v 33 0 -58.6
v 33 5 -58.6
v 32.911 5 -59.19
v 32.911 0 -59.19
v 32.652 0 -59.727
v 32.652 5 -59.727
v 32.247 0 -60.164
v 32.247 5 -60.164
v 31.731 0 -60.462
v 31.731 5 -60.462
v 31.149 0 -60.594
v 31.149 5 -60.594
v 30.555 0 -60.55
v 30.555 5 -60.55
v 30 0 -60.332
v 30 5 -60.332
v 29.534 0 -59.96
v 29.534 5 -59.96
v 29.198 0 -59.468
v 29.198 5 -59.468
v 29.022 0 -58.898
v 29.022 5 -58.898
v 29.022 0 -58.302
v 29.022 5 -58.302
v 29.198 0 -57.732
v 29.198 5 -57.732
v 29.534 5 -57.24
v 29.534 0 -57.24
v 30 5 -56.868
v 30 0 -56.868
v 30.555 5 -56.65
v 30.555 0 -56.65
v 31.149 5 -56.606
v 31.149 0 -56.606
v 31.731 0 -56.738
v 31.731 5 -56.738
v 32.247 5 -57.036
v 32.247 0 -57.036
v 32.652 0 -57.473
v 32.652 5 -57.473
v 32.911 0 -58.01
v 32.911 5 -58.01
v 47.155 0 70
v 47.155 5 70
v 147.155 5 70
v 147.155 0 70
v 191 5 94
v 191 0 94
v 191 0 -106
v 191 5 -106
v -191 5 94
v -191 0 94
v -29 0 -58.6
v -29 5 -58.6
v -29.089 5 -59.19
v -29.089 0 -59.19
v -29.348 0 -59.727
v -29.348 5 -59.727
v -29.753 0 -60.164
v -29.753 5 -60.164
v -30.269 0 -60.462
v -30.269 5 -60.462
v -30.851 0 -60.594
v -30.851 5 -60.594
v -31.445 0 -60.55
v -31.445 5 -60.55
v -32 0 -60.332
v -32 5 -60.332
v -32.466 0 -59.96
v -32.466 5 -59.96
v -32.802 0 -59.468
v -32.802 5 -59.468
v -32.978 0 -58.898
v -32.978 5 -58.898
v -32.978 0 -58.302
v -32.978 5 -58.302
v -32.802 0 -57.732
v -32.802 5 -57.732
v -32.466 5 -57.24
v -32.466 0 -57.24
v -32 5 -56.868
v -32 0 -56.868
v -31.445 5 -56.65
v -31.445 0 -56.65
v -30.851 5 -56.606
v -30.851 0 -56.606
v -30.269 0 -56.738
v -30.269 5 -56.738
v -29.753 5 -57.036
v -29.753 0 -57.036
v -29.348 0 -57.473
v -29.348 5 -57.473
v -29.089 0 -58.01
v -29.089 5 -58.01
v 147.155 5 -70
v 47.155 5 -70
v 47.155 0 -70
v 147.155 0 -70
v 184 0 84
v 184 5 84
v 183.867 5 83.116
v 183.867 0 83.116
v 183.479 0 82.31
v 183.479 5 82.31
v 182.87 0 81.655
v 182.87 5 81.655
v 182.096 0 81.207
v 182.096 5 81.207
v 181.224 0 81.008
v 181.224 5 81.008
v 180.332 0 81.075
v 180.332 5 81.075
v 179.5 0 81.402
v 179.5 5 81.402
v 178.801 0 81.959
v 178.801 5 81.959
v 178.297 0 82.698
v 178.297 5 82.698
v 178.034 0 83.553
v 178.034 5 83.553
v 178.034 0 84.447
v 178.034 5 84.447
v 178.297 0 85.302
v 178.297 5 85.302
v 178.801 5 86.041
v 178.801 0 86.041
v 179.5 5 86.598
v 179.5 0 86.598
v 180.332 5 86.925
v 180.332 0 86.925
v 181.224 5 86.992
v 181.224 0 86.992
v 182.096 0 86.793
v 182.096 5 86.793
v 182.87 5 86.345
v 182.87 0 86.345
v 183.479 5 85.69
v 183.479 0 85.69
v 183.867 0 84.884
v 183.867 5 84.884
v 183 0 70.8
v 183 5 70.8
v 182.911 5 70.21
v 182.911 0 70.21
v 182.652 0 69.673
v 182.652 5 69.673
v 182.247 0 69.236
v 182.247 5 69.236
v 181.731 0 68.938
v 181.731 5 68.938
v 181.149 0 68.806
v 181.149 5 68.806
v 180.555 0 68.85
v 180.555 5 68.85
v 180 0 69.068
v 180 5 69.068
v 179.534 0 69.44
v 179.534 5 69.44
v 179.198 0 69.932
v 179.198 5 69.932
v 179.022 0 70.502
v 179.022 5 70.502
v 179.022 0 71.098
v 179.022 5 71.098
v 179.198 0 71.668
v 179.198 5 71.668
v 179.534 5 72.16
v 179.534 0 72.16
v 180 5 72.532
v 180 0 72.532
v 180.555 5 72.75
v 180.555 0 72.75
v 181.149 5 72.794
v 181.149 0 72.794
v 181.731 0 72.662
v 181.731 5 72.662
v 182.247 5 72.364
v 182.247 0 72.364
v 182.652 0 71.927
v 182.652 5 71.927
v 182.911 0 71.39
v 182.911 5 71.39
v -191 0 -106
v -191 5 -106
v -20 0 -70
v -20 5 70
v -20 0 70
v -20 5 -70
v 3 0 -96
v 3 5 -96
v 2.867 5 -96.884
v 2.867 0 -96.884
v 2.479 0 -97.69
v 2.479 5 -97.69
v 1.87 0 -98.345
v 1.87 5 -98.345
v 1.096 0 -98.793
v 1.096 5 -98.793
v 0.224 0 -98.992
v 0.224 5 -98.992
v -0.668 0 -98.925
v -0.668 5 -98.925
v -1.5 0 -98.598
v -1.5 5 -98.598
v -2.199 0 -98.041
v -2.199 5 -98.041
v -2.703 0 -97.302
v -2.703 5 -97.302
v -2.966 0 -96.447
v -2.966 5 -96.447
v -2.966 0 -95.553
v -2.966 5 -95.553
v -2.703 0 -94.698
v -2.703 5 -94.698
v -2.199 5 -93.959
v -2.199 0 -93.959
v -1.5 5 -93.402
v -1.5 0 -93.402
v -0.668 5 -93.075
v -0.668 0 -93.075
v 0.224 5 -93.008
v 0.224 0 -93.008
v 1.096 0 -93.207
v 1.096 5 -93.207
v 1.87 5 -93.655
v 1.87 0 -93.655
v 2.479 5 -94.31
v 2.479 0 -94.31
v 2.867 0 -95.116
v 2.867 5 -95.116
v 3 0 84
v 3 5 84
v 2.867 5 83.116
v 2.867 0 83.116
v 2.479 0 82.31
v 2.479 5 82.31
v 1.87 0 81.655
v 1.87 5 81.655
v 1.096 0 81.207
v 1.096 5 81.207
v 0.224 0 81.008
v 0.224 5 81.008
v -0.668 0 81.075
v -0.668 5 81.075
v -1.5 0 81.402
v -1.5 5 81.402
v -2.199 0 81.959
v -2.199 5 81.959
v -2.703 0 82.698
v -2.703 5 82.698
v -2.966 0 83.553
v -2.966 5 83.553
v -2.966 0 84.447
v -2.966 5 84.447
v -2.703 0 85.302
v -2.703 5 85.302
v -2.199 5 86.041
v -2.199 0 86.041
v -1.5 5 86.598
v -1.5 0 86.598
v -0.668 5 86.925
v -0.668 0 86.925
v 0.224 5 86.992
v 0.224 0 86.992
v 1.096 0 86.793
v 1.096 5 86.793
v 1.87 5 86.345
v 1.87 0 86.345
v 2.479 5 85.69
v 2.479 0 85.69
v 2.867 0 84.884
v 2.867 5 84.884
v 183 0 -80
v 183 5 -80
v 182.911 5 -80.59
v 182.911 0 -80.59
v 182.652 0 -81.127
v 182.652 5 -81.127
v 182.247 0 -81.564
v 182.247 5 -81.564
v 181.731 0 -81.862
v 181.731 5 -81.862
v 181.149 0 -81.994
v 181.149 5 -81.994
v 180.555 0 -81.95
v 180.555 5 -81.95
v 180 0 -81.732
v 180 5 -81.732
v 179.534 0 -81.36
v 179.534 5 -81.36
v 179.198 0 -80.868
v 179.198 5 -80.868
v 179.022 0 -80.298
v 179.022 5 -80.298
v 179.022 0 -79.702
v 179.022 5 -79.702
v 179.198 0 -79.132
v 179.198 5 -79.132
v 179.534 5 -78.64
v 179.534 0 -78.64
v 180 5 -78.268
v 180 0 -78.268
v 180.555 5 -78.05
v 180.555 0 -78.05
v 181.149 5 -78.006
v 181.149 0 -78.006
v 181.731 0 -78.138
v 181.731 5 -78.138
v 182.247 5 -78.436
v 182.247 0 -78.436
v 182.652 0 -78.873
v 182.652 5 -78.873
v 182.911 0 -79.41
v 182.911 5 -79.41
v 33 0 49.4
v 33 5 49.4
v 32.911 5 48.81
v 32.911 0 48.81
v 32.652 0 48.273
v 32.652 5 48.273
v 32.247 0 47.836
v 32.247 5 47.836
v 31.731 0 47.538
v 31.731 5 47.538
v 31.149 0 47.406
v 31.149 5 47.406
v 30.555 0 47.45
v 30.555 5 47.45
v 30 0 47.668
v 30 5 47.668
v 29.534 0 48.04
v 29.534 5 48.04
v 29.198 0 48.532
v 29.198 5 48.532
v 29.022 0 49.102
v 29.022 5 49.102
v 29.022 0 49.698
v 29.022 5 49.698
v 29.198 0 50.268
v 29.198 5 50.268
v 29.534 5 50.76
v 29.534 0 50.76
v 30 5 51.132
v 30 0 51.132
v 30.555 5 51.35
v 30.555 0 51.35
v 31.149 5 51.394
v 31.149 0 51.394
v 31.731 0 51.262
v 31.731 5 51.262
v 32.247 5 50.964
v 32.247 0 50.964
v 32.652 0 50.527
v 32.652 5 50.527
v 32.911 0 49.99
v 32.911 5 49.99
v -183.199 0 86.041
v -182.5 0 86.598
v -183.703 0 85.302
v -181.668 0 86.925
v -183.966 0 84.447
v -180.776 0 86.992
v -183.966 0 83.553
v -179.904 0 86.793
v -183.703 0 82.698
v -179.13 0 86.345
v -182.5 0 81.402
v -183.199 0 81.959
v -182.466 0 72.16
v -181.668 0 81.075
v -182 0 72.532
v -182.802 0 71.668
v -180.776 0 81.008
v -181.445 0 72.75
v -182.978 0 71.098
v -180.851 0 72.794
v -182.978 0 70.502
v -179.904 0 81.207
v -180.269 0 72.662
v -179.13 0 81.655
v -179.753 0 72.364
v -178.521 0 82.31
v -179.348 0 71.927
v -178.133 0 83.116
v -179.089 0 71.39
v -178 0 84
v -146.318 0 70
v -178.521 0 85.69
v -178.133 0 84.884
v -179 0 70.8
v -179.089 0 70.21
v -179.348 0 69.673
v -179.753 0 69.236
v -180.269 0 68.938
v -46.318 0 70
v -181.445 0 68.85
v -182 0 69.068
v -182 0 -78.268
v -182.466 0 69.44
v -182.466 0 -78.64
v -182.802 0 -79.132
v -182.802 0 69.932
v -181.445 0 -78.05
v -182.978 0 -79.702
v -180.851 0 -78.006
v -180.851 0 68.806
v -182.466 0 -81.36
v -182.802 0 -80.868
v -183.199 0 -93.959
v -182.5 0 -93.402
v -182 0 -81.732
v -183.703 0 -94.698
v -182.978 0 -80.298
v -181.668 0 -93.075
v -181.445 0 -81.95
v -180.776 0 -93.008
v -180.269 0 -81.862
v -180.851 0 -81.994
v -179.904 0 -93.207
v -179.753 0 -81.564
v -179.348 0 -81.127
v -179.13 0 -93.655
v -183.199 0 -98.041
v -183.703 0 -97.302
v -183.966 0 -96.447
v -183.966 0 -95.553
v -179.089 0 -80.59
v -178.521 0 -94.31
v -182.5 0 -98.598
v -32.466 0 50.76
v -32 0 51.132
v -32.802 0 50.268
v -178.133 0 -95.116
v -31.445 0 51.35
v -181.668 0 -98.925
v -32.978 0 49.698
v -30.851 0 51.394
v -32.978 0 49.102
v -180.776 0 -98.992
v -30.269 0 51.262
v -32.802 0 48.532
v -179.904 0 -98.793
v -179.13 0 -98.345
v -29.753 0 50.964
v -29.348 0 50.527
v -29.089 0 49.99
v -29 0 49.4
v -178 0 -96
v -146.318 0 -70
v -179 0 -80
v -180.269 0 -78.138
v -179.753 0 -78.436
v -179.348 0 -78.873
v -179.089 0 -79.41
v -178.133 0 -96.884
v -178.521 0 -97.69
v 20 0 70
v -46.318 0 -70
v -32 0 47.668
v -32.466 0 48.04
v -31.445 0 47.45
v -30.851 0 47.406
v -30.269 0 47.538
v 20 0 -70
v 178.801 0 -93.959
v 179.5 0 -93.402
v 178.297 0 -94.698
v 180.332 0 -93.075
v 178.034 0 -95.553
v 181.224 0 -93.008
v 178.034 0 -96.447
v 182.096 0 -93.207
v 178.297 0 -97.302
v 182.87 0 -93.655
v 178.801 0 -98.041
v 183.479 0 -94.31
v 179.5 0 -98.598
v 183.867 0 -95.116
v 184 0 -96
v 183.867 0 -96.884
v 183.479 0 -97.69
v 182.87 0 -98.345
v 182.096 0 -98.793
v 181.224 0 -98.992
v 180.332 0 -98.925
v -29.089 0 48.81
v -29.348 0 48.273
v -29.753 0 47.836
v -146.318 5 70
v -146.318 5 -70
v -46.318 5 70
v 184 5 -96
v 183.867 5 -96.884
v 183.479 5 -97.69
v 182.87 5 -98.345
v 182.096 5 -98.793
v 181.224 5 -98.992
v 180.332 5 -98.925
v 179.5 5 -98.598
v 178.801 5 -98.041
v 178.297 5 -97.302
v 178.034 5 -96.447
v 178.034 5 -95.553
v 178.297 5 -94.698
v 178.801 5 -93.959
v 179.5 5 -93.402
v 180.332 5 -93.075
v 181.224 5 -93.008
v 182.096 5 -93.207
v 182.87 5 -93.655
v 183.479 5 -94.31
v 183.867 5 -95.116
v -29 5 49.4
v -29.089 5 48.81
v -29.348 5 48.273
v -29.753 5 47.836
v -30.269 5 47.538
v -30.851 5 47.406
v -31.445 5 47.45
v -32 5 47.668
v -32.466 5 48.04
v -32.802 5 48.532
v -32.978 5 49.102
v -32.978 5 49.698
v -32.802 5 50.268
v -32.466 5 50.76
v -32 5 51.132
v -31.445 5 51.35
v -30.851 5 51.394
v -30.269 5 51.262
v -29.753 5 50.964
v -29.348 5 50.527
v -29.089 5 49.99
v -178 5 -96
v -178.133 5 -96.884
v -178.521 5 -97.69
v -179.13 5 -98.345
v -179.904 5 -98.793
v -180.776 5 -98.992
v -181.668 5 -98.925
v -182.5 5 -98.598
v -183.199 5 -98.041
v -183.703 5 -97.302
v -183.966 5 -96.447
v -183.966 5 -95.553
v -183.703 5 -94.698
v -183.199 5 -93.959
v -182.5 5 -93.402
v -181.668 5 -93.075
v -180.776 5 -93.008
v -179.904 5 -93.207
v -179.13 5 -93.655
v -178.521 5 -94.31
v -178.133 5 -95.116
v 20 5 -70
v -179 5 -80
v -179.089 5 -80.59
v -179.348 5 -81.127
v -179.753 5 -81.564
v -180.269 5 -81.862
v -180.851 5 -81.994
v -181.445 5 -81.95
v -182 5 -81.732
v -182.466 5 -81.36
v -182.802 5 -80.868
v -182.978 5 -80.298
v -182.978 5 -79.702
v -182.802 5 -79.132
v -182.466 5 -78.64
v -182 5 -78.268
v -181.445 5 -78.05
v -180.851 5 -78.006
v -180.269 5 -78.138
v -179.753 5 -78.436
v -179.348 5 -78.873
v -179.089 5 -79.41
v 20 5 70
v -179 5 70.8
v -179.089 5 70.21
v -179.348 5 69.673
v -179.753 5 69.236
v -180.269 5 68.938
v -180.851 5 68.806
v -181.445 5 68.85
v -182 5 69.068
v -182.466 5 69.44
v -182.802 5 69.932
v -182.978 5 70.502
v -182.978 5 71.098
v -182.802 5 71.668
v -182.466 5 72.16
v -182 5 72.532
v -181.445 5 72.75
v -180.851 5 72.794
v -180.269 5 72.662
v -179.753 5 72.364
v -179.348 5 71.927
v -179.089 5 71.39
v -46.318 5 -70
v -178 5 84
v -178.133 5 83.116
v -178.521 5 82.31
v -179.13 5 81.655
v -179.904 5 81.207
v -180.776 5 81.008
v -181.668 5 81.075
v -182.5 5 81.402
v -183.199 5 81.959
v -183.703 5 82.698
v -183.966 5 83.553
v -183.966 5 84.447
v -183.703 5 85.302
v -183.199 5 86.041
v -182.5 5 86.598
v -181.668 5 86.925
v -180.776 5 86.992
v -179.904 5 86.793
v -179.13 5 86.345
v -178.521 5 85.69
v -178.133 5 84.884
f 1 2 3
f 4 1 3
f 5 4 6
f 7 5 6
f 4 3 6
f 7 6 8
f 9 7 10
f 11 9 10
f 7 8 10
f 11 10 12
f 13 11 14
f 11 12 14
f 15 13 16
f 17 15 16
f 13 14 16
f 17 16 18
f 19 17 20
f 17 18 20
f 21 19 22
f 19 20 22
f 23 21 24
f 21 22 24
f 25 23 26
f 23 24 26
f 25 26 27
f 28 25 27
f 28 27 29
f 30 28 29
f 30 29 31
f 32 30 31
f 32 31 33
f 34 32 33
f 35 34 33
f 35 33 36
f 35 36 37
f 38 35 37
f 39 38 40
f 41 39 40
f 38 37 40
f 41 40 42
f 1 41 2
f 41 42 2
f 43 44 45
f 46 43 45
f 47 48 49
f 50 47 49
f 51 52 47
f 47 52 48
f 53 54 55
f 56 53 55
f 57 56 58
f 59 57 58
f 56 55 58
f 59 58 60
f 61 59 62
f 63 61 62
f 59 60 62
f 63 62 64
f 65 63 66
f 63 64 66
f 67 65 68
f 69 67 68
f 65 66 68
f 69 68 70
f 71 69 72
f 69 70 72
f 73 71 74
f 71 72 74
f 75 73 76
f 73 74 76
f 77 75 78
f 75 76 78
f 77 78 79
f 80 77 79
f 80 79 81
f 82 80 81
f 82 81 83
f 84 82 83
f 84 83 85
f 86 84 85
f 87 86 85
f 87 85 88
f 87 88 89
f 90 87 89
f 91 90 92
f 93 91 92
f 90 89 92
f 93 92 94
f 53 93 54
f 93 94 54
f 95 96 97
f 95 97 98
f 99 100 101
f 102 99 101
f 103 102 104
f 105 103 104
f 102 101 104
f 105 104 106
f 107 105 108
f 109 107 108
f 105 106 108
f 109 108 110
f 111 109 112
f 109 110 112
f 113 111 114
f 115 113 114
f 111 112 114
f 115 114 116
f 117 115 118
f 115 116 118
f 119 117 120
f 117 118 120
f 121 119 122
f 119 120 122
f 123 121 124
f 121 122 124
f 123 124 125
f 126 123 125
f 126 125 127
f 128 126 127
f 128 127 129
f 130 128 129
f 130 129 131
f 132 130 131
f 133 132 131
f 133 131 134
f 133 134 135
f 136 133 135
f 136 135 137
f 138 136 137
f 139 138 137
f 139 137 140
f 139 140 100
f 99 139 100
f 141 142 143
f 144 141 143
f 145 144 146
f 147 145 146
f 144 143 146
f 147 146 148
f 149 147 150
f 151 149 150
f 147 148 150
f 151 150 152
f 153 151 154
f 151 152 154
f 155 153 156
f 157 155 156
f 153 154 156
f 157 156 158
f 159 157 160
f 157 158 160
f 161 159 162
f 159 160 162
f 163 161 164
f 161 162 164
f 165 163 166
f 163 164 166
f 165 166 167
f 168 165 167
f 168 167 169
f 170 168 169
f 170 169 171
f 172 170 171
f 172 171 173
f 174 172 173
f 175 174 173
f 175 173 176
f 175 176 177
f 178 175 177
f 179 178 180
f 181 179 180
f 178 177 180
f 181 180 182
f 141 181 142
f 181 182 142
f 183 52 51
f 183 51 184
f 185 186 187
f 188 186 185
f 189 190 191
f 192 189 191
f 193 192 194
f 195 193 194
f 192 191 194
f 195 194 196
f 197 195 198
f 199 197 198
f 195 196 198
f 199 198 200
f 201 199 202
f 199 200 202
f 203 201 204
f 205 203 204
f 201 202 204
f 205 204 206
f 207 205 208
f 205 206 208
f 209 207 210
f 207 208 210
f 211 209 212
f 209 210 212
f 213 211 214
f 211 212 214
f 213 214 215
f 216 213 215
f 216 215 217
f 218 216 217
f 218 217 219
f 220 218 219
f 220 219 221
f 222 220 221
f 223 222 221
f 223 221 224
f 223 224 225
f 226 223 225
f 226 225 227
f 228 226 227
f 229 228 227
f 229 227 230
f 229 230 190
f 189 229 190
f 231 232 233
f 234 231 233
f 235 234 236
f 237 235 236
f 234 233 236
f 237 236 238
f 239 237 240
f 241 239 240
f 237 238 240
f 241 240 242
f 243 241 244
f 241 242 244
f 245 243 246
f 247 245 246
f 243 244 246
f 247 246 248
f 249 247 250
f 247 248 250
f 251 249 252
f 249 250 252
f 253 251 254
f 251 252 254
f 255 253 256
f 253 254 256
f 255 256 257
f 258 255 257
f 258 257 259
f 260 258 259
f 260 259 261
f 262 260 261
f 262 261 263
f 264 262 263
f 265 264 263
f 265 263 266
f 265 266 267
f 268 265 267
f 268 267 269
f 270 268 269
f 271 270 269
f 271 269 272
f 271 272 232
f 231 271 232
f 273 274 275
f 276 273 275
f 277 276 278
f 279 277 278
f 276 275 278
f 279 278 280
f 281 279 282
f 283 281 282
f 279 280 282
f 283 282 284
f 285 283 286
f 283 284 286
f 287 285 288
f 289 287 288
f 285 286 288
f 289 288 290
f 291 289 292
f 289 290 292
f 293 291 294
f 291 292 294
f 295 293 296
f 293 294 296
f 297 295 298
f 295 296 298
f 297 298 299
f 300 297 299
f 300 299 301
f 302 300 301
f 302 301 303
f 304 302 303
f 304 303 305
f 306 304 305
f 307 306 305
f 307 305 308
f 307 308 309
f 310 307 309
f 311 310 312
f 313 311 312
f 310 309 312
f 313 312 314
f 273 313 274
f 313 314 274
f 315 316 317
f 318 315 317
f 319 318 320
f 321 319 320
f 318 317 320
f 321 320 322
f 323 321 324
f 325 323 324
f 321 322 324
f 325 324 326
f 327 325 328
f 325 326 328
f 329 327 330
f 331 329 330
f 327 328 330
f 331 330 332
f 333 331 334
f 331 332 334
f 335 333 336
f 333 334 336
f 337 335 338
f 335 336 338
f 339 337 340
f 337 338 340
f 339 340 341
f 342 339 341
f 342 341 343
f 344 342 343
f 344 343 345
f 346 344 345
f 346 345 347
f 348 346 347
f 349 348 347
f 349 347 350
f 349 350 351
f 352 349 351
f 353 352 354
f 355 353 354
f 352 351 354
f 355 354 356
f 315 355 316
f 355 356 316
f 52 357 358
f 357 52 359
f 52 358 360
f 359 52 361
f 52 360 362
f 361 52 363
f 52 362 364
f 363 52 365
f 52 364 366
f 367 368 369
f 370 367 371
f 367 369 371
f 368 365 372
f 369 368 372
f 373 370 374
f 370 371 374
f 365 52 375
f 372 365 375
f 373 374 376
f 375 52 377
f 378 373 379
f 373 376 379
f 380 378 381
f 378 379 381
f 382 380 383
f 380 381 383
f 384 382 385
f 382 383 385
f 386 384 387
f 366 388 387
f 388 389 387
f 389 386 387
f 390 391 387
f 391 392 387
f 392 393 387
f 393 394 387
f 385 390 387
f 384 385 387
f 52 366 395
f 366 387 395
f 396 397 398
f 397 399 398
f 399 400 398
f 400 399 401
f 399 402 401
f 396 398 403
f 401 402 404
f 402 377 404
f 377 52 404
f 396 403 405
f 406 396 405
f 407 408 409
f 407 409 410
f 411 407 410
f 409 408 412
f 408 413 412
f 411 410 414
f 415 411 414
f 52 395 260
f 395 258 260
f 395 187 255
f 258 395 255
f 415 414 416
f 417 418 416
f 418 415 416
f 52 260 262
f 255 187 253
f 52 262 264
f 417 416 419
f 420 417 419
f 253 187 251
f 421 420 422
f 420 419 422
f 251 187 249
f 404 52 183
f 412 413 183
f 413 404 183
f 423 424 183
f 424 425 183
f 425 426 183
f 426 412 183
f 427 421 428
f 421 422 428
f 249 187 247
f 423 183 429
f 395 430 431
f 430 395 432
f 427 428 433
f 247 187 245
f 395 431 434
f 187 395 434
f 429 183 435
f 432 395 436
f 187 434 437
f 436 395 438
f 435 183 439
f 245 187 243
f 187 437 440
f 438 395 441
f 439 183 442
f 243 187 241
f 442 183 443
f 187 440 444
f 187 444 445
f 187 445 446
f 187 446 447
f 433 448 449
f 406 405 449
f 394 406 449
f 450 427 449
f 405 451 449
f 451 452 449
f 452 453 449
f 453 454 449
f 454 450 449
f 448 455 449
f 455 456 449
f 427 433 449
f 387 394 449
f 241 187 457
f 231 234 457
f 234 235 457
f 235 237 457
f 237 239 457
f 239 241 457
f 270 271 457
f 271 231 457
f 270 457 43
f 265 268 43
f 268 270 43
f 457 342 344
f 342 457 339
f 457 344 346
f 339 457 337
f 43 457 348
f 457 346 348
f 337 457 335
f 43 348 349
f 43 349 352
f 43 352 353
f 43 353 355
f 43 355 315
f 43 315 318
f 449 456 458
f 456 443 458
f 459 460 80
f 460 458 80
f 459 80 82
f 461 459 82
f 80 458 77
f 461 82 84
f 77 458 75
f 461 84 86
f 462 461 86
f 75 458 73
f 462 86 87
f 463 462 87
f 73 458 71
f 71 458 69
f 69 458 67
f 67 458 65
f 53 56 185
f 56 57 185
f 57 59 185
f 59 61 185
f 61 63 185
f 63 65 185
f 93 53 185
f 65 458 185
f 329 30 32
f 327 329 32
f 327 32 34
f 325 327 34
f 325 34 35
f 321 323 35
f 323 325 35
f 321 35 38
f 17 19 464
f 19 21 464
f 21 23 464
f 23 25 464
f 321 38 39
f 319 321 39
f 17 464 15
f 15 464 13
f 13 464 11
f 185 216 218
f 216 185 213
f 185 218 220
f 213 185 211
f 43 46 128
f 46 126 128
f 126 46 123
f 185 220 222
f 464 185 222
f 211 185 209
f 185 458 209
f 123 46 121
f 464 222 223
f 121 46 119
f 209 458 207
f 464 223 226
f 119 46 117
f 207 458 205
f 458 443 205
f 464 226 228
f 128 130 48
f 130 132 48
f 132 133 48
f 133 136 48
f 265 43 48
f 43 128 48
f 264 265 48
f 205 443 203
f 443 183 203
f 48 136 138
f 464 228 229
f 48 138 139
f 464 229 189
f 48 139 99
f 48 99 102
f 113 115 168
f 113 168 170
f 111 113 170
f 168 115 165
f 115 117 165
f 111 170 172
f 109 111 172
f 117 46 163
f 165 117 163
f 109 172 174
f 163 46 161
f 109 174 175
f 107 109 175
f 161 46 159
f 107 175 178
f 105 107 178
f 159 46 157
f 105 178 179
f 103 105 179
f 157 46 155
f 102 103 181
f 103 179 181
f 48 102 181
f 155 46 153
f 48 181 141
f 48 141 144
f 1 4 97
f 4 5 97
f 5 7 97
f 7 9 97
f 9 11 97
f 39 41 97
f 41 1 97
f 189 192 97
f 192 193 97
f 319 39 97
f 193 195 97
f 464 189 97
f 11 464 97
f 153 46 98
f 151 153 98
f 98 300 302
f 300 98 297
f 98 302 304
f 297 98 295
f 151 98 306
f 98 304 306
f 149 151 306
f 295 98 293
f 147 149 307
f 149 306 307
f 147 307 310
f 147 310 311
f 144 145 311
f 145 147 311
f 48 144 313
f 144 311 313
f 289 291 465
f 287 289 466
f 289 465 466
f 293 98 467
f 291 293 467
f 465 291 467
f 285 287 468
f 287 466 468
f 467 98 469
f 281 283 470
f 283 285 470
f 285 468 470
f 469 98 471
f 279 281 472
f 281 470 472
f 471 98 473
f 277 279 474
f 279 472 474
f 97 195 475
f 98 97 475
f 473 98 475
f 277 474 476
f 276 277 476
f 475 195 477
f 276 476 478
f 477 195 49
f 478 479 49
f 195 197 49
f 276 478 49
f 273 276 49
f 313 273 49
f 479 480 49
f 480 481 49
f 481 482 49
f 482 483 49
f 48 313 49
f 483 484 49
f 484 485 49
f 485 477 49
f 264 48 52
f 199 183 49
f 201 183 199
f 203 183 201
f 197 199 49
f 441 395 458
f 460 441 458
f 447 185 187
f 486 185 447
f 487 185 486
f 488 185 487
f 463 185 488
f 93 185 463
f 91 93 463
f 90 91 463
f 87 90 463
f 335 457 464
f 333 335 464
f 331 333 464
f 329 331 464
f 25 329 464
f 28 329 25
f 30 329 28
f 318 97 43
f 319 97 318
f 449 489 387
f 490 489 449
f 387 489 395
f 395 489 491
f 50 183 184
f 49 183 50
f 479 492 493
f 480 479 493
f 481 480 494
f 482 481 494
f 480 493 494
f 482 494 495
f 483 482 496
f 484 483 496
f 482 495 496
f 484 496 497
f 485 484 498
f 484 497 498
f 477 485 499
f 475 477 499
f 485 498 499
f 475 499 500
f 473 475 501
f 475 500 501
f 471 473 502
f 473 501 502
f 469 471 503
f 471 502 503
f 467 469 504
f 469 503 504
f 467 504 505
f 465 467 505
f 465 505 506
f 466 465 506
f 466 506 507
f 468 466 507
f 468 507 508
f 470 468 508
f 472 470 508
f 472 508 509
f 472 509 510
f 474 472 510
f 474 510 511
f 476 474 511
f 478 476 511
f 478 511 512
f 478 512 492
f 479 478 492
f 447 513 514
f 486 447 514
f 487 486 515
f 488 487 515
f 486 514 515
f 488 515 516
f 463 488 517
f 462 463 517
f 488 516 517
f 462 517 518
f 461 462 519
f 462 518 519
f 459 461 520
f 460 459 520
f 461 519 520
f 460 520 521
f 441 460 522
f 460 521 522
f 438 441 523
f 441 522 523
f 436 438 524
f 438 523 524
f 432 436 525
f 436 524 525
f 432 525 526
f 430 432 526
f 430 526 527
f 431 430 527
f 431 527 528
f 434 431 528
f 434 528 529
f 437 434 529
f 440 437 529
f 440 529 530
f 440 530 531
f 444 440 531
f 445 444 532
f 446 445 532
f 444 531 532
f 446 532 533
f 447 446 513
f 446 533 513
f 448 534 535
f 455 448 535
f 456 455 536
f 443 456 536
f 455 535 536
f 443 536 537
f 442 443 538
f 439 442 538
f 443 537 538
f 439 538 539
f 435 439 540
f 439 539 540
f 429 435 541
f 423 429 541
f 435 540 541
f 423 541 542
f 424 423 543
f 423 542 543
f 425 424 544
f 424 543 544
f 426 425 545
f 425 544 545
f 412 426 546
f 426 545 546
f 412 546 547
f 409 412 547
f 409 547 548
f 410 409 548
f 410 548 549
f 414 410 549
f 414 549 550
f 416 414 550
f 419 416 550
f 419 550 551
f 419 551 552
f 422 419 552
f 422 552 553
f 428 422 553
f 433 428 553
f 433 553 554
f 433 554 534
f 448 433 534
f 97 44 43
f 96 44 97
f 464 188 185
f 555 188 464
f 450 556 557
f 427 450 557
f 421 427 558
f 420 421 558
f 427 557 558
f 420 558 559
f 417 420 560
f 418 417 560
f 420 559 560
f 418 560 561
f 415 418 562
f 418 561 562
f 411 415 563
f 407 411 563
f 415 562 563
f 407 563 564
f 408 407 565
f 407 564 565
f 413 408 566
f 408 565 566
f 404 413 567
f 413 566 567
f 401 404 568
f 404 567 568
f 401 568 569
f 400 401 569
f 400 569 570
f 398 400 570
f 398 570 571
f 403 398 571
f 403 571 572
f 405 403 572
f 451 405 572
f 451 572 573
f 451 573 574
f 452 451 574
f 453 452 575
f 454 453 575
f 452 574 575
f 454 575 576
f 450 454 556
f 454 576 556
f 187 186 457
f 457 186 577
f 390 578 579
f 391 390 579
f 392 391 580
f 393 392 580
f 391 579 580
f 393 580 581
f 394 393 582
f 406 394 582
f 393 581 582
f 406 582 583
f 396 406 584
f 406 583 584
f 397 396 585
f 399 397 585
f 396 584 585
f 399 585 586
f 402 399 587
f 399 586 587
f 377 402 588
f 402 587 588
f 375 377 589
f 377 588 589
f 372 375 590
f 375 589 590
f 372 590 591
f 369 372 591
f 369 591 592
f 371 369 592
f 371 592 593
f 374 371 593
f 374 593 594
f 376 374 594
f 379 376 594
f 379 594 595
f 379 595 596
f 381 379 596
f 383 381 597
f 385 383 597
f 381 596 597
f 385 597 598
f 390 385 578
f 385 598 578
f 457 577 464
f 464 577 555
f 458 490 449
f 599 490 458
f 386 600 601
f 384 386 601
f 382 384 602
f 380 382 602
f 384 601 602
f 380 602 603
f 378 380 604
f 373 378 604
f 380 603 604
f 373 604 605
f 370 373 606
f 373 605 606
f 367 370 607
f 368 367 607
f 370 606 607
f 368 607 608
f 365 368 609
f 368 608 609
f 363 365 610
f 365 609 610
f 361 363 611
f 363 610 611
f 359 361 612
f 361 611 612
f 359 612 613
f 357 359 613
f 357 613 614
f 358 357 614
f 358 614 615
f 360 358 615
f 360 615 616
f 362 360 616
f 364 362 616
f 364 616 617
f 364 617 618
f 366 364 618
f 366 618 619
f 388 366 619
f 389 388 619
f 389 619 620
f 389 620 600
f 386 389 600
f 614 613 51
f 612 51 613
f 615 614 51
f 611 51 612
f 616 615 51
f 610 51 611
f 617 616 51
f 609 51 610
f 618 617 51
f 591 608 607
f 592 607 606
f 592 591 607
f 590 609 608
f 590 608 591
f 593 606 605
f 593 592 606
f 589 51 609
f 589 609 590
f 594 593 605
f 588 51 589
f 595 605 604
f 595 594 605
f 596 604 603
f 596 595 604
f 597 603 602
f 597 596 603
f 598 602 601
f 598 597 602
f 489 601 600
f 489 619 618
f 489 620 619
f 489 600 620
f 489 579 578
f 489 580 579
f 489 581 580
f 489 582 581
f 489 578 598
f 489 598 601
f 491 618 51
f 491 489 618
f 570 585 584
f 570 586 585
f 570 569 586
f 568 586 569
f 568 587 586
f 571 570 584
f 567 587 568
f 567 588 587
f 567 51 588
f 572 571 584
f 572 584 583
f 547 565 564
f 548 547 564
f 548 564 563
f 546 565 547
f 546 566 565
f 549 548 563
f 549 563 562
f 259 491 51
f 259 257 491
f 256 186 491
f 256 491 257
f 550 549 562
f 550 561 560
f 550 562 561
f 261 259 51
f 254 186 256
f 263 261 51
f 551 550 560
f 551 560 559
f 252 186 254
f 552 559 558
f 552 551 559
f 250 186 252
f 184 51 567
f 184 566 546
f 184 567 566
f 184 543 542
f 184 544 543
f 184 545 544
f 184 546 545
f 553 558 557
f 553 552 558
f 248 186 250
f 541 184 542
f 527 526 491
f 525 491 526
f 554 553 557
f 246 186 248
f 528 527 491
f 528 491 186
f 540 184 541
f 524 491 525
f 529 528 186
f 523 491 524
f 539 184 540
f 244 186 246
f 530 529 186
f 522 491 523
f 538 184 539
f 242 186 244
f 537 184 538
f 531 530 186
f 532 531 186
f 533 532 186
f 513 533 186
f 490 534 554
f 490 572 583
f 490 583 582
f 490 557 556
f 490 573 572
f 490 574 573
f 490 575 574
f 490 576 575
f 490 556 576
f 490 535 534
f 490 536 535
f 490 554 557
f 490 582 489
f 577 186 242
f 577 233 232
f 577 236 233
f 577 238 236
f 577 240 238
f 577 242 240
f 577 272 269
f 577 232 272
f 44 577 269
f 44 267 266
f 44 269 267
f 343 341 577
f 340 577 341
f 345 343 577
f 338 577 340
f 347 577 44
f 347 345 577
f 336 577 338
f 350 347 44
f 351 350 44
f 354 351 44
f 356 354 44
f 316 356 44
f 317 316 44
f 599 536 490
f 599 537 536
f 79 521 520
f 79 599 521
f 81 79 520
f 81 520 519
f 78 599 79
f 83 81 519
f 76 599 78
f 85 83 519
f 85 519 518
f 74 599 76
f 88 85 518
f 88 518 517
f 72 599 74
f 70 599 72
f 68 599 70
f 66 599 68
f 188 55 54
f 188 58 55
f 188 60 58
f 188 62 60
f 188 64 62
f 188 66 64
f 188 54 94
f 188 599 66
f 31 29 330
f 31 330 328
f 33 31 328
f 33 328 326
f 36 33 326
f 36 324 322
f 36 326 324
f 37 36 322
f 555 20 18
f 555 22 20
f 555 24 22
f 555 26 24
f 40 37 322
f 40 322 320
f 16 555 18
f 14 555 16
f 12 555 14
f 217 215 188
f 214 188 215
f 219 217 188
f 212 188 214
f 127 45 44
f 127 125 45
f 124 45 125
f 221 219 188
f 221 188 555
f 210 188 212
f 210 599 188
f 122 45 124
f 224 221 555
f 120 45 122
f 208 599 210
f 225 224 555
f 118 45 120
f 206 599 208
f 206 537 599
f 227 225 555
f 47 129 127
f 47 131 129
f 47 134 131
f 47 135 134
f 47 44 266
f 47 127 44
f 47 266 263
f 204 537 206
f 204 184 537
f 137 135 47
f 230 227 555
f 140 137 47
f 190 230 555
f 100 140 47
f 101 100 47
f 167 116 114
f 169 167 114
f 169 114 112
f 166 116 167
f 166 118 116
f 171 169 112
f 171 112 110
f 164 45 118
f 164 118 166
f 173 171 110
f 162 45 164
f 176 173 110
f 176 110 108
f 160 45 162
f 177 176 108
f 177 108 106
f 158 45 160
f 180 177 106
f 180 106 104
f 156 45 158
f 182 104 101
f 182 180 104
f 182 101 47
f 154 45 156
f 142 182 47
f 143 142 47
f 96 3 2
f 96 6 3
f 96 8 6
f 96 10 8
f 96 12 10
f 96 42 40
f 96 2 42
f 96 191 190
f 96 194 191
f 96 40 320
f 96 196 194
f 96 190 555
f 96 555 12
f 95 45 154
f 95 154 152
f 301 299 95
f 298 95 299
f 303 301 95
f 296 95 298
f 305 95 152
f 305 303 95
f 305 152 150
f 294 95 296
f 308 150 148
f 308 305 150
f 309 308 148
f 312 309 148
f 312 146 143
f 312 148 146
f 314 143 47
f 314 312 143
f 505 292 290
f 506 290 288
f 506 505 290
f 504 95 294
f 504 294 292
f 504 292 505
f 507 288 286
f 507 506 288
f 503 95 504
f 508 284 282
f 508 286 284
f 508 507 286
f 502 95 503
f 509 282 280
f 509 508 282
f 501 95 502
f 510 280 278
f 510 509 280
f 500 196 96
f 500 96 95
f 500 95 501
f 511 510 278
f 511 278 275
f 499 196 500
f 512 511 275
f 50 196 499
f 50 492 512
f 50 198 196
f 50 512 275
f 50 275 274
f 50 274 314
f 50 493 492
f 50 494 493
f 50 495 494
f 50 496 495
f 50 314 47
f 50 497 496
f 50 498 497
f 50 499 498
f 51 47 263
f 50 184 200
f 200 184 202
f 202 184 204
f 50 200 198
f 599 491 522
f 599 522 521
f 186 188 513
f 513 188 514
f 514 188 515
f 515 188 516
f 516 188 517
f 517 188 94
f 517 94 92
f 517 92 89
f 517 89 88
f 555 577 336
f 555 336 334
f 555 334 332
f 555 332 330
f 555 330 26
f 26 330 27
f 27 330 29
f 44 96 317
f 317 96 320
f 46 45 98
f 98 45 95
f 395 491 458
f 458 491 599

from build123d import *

# Parameters (mm, degrees)
SKETCH1_W           = 382
SKETCH1_H           = 200
BOSS_EXTRUDE5_DEPTH = 5
SKETCH7_R           = 2
CUT_EXTRUDE4_DEPTH  = 5
SKETCH8_W           = 40
SKETCH8_H           = 140
SKETCH8_W_2         = 100
CUT_EXTRUDE5_DEPTH  = 10
SKETCH9_R           = 3
CUT_EXTRUDE6_DEPTH  = 10


with BuildPart() as part:
    # Sketch1 → Boss-Extrude5 (new body)
    with BuildSketch(Plane(origin=(0, 0, 0), x_dir=(1, 0, 0), z_dir=(0, 1, 0))):
        with Locations((0, 6)):
            Rectangle(SKETCH1_W, SKETCH1_H)
    extrude(amount=BOSS_EXTRUDE5_DEPTH)

    # Sketch7 → Cut-Extrude4 (cut)
    with BuildSketch(Plane(origin=(0, 5, 0), x_dir=(1, 0, 0), z_dir=(0, 1, 0))):
        with Locations((181, 80)):
            Circle(SKETCH7_R)
        with Locations((181, -70.8)):
            Circle(SKETCH7_R)
        with Locations((31, 58.6)):
            Circle(SKETCH7_R)
        with Locations((-31, 58.6)):
            Circle(SKETCH7_R)
        with Locations((-181, 80)):
            Circle(SKETCH7_R)
        with Locations((-181, -70.8)):
            Circle(SKETCH7_R)
        with Locations((31, -49.4)):
            Circle(SKETCH7_R)
        with Locations((-31, -49.4)):
            Circle(SKETCH7_R)
    extrude(amount=-CUT_EXTRUDE4_DEPTH, mode=Mode.SUBTRACT)

    # Sketch8 → Cut-Extrude5 (cut)
    with BuildSketch(Plane(origin=(0, 5, 0), x_dir=(1, 0, 0), z_dir=(0, 1, 0))):
        Rectangle(SKETCH8_W, SKETCH8_H)
        with Locations((97.15487949, 0)):
            Rectangle(SKETCH8_W_2, SKETCH8_H)
        with Locations((-96.318135121, 0)):
            Rectangle(SKETCH8_W_2, SKETCH8_H)
    extrude(amount=-CUT_EXTRUDE5_DEPTH, mode=Mode.SUBTRACT)

    # Sketch9 → Cut-Extrude6 (cut)
    with BuildSketch(Plane(origin=(0, 5, 0), x_dir=(1, 0, 0), z_dir=(0, 1, 0))):
        with Locations((181, 96)):
            Circle(SKETCH9_R)
        with Locations((181, -84)):
            Circle(SKETCH9_R)
        with Locations((-181, 96)):
            Circle(SKETCH9_R)
        with Locations((-181, -84)):
            Circle(SKETCH9_R)
        with Locations((0, 96)):
            Circle(SKETCH9_R)
        with Locations((0, -84)):
            Circle(SKETCH9_R)
    extrude(amount=-CUT_EXTRUDE6_DEPTH, mode=Mode.SUBTRACT)


solid = part.part
